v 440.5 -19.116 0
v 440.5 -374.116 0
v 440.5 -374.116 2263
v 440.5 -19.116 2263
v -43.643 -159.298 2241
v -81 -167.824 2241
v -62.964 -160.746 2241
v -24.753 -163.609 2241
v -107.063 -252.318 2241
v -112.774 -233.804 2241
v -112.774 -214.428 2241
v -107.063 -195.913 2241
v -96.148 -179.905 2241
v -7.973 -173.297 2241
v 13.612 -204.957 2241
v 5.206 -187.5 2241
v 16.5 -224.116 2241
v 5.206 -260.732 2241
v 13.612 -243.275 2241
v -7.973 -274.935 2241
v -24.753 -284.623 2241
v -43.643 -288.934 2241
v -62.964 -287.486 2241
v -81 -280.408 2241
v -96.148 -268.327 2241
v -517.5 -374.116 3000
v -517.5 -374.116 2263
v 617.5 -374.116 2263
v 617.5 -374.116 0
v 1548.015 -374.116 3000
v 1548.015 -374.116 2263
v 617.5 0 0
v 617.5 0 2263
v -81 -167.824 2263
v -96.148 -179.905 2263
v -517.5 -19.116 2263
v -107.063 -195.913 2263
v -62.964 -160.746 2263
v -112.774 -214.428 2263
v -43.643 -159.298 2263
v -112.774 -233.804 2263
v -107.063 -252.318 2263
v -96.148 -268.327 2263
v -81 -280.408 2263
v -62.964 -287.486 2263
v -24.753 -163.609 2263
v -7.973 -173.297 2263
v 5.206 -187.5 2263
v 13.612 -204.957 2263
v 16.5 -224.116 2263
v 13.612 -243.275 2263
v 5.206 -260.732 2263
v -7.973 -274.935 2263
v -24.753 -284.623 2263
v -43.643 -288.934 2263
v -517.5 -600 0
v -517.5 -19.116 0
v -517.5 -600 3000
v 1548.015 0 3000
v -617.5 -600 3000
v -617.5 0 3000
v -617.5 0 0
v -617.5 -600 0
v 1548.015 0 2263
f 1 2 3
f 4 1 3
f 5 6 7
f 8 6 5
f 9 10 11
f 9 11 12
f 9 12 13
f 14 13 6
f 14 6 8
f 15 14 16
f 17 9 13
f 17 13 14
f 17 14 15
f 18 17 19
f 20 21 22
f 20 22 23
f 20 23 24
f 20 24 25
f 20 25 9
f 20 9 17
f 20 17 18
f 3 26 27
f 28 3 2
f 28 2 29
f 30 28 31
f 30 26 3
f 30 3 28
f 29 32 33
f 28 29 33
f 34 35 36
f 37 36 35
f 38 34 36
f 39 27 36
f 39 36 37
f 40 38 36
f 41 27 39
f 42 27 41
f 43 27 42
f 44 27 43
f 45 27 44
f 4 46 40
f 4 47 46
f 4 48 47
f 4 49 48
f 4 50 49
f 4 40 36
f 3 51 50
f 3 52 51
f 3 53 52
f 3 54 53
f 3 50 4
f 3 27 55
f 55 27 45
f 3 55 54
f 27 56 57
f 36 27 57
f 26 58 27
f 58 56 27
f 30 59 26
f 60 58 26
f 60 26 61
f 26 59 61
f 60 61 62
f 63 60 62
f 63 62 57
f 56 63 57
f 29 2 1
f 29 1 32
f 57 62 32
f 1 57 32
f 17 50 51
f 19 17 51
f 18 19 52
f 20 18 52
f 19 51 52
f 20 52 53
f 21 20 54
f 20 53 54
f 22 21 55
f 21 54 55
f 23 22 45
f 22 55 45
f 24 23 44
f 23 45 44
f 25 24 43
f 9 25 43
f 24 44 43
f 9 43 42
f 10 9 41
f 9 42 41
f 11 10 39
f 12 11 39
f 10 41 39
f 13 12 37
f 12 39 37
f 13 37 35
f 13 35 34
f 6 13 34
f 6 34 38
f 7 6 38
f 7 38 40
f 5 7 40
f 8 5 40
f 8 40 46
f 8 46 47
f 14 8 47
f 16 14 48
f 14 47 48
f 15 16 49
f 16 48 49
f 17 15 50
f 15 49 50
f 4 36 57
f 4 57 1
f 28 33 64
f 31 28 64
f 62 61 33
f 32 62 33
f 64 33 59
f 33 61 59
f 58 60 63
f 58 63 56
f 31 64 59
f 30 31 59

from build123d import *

# Parameters (mm, degrees)
F1_DEPTH = 600
F2_W     = 2065.5151176453
F2_H     = 225.8841454983
F3_DEPTH = 4000
F4_W     = 958
F4_H     = 2263
F5_DEPTH = 355
F6_R     = 65
F7_DEPTH = 22


with BuildPart() as f1:
    # F0 (on Front) → F1 (new body)
    with BuildSketch(Plane.XZ):
        Polygon((-617.5, 3000), (-617.5, 0), (617.5, 0), (617.5, 2263), (1548.0151176453, 2263), (1548.0151176453, 3000), align=None)
    extrude(amount=F1_DEPTH)

    # F2 (on face) → F3 (cut)
    with BuildSketch(Plane.XY.offset(3000)):
        with Locations((515.2575588226, -487.0579272509)):
            Rectangle(F2_W, F2_H)
    extrude(amount=-F3_DEPTH, mode=Mode.SUBTRACT)

    # F4 (on face) → F5 (cut)
    with BuildSketch(Plane.XZ.offset(374.1158545017)):
        with Locations((-38.5, 1131.5)):
            Rectangle(F4_W, F4_H)
    extrude(amount=-F5_DEPTH, mode=Mode.SUBTRACT)

    # F6 (on face) → F7 (join)
    with BuildSketch(Plane(origin=(0, 0, 2263), x_dir=(1, 0, 0), z_dir=(0, 0, -1))):
        with Locations((-48.5, 224.1158545017)):
            Circle(F6_R)
    extrude(amount=F7_DEPTH)


solid = f1.part
